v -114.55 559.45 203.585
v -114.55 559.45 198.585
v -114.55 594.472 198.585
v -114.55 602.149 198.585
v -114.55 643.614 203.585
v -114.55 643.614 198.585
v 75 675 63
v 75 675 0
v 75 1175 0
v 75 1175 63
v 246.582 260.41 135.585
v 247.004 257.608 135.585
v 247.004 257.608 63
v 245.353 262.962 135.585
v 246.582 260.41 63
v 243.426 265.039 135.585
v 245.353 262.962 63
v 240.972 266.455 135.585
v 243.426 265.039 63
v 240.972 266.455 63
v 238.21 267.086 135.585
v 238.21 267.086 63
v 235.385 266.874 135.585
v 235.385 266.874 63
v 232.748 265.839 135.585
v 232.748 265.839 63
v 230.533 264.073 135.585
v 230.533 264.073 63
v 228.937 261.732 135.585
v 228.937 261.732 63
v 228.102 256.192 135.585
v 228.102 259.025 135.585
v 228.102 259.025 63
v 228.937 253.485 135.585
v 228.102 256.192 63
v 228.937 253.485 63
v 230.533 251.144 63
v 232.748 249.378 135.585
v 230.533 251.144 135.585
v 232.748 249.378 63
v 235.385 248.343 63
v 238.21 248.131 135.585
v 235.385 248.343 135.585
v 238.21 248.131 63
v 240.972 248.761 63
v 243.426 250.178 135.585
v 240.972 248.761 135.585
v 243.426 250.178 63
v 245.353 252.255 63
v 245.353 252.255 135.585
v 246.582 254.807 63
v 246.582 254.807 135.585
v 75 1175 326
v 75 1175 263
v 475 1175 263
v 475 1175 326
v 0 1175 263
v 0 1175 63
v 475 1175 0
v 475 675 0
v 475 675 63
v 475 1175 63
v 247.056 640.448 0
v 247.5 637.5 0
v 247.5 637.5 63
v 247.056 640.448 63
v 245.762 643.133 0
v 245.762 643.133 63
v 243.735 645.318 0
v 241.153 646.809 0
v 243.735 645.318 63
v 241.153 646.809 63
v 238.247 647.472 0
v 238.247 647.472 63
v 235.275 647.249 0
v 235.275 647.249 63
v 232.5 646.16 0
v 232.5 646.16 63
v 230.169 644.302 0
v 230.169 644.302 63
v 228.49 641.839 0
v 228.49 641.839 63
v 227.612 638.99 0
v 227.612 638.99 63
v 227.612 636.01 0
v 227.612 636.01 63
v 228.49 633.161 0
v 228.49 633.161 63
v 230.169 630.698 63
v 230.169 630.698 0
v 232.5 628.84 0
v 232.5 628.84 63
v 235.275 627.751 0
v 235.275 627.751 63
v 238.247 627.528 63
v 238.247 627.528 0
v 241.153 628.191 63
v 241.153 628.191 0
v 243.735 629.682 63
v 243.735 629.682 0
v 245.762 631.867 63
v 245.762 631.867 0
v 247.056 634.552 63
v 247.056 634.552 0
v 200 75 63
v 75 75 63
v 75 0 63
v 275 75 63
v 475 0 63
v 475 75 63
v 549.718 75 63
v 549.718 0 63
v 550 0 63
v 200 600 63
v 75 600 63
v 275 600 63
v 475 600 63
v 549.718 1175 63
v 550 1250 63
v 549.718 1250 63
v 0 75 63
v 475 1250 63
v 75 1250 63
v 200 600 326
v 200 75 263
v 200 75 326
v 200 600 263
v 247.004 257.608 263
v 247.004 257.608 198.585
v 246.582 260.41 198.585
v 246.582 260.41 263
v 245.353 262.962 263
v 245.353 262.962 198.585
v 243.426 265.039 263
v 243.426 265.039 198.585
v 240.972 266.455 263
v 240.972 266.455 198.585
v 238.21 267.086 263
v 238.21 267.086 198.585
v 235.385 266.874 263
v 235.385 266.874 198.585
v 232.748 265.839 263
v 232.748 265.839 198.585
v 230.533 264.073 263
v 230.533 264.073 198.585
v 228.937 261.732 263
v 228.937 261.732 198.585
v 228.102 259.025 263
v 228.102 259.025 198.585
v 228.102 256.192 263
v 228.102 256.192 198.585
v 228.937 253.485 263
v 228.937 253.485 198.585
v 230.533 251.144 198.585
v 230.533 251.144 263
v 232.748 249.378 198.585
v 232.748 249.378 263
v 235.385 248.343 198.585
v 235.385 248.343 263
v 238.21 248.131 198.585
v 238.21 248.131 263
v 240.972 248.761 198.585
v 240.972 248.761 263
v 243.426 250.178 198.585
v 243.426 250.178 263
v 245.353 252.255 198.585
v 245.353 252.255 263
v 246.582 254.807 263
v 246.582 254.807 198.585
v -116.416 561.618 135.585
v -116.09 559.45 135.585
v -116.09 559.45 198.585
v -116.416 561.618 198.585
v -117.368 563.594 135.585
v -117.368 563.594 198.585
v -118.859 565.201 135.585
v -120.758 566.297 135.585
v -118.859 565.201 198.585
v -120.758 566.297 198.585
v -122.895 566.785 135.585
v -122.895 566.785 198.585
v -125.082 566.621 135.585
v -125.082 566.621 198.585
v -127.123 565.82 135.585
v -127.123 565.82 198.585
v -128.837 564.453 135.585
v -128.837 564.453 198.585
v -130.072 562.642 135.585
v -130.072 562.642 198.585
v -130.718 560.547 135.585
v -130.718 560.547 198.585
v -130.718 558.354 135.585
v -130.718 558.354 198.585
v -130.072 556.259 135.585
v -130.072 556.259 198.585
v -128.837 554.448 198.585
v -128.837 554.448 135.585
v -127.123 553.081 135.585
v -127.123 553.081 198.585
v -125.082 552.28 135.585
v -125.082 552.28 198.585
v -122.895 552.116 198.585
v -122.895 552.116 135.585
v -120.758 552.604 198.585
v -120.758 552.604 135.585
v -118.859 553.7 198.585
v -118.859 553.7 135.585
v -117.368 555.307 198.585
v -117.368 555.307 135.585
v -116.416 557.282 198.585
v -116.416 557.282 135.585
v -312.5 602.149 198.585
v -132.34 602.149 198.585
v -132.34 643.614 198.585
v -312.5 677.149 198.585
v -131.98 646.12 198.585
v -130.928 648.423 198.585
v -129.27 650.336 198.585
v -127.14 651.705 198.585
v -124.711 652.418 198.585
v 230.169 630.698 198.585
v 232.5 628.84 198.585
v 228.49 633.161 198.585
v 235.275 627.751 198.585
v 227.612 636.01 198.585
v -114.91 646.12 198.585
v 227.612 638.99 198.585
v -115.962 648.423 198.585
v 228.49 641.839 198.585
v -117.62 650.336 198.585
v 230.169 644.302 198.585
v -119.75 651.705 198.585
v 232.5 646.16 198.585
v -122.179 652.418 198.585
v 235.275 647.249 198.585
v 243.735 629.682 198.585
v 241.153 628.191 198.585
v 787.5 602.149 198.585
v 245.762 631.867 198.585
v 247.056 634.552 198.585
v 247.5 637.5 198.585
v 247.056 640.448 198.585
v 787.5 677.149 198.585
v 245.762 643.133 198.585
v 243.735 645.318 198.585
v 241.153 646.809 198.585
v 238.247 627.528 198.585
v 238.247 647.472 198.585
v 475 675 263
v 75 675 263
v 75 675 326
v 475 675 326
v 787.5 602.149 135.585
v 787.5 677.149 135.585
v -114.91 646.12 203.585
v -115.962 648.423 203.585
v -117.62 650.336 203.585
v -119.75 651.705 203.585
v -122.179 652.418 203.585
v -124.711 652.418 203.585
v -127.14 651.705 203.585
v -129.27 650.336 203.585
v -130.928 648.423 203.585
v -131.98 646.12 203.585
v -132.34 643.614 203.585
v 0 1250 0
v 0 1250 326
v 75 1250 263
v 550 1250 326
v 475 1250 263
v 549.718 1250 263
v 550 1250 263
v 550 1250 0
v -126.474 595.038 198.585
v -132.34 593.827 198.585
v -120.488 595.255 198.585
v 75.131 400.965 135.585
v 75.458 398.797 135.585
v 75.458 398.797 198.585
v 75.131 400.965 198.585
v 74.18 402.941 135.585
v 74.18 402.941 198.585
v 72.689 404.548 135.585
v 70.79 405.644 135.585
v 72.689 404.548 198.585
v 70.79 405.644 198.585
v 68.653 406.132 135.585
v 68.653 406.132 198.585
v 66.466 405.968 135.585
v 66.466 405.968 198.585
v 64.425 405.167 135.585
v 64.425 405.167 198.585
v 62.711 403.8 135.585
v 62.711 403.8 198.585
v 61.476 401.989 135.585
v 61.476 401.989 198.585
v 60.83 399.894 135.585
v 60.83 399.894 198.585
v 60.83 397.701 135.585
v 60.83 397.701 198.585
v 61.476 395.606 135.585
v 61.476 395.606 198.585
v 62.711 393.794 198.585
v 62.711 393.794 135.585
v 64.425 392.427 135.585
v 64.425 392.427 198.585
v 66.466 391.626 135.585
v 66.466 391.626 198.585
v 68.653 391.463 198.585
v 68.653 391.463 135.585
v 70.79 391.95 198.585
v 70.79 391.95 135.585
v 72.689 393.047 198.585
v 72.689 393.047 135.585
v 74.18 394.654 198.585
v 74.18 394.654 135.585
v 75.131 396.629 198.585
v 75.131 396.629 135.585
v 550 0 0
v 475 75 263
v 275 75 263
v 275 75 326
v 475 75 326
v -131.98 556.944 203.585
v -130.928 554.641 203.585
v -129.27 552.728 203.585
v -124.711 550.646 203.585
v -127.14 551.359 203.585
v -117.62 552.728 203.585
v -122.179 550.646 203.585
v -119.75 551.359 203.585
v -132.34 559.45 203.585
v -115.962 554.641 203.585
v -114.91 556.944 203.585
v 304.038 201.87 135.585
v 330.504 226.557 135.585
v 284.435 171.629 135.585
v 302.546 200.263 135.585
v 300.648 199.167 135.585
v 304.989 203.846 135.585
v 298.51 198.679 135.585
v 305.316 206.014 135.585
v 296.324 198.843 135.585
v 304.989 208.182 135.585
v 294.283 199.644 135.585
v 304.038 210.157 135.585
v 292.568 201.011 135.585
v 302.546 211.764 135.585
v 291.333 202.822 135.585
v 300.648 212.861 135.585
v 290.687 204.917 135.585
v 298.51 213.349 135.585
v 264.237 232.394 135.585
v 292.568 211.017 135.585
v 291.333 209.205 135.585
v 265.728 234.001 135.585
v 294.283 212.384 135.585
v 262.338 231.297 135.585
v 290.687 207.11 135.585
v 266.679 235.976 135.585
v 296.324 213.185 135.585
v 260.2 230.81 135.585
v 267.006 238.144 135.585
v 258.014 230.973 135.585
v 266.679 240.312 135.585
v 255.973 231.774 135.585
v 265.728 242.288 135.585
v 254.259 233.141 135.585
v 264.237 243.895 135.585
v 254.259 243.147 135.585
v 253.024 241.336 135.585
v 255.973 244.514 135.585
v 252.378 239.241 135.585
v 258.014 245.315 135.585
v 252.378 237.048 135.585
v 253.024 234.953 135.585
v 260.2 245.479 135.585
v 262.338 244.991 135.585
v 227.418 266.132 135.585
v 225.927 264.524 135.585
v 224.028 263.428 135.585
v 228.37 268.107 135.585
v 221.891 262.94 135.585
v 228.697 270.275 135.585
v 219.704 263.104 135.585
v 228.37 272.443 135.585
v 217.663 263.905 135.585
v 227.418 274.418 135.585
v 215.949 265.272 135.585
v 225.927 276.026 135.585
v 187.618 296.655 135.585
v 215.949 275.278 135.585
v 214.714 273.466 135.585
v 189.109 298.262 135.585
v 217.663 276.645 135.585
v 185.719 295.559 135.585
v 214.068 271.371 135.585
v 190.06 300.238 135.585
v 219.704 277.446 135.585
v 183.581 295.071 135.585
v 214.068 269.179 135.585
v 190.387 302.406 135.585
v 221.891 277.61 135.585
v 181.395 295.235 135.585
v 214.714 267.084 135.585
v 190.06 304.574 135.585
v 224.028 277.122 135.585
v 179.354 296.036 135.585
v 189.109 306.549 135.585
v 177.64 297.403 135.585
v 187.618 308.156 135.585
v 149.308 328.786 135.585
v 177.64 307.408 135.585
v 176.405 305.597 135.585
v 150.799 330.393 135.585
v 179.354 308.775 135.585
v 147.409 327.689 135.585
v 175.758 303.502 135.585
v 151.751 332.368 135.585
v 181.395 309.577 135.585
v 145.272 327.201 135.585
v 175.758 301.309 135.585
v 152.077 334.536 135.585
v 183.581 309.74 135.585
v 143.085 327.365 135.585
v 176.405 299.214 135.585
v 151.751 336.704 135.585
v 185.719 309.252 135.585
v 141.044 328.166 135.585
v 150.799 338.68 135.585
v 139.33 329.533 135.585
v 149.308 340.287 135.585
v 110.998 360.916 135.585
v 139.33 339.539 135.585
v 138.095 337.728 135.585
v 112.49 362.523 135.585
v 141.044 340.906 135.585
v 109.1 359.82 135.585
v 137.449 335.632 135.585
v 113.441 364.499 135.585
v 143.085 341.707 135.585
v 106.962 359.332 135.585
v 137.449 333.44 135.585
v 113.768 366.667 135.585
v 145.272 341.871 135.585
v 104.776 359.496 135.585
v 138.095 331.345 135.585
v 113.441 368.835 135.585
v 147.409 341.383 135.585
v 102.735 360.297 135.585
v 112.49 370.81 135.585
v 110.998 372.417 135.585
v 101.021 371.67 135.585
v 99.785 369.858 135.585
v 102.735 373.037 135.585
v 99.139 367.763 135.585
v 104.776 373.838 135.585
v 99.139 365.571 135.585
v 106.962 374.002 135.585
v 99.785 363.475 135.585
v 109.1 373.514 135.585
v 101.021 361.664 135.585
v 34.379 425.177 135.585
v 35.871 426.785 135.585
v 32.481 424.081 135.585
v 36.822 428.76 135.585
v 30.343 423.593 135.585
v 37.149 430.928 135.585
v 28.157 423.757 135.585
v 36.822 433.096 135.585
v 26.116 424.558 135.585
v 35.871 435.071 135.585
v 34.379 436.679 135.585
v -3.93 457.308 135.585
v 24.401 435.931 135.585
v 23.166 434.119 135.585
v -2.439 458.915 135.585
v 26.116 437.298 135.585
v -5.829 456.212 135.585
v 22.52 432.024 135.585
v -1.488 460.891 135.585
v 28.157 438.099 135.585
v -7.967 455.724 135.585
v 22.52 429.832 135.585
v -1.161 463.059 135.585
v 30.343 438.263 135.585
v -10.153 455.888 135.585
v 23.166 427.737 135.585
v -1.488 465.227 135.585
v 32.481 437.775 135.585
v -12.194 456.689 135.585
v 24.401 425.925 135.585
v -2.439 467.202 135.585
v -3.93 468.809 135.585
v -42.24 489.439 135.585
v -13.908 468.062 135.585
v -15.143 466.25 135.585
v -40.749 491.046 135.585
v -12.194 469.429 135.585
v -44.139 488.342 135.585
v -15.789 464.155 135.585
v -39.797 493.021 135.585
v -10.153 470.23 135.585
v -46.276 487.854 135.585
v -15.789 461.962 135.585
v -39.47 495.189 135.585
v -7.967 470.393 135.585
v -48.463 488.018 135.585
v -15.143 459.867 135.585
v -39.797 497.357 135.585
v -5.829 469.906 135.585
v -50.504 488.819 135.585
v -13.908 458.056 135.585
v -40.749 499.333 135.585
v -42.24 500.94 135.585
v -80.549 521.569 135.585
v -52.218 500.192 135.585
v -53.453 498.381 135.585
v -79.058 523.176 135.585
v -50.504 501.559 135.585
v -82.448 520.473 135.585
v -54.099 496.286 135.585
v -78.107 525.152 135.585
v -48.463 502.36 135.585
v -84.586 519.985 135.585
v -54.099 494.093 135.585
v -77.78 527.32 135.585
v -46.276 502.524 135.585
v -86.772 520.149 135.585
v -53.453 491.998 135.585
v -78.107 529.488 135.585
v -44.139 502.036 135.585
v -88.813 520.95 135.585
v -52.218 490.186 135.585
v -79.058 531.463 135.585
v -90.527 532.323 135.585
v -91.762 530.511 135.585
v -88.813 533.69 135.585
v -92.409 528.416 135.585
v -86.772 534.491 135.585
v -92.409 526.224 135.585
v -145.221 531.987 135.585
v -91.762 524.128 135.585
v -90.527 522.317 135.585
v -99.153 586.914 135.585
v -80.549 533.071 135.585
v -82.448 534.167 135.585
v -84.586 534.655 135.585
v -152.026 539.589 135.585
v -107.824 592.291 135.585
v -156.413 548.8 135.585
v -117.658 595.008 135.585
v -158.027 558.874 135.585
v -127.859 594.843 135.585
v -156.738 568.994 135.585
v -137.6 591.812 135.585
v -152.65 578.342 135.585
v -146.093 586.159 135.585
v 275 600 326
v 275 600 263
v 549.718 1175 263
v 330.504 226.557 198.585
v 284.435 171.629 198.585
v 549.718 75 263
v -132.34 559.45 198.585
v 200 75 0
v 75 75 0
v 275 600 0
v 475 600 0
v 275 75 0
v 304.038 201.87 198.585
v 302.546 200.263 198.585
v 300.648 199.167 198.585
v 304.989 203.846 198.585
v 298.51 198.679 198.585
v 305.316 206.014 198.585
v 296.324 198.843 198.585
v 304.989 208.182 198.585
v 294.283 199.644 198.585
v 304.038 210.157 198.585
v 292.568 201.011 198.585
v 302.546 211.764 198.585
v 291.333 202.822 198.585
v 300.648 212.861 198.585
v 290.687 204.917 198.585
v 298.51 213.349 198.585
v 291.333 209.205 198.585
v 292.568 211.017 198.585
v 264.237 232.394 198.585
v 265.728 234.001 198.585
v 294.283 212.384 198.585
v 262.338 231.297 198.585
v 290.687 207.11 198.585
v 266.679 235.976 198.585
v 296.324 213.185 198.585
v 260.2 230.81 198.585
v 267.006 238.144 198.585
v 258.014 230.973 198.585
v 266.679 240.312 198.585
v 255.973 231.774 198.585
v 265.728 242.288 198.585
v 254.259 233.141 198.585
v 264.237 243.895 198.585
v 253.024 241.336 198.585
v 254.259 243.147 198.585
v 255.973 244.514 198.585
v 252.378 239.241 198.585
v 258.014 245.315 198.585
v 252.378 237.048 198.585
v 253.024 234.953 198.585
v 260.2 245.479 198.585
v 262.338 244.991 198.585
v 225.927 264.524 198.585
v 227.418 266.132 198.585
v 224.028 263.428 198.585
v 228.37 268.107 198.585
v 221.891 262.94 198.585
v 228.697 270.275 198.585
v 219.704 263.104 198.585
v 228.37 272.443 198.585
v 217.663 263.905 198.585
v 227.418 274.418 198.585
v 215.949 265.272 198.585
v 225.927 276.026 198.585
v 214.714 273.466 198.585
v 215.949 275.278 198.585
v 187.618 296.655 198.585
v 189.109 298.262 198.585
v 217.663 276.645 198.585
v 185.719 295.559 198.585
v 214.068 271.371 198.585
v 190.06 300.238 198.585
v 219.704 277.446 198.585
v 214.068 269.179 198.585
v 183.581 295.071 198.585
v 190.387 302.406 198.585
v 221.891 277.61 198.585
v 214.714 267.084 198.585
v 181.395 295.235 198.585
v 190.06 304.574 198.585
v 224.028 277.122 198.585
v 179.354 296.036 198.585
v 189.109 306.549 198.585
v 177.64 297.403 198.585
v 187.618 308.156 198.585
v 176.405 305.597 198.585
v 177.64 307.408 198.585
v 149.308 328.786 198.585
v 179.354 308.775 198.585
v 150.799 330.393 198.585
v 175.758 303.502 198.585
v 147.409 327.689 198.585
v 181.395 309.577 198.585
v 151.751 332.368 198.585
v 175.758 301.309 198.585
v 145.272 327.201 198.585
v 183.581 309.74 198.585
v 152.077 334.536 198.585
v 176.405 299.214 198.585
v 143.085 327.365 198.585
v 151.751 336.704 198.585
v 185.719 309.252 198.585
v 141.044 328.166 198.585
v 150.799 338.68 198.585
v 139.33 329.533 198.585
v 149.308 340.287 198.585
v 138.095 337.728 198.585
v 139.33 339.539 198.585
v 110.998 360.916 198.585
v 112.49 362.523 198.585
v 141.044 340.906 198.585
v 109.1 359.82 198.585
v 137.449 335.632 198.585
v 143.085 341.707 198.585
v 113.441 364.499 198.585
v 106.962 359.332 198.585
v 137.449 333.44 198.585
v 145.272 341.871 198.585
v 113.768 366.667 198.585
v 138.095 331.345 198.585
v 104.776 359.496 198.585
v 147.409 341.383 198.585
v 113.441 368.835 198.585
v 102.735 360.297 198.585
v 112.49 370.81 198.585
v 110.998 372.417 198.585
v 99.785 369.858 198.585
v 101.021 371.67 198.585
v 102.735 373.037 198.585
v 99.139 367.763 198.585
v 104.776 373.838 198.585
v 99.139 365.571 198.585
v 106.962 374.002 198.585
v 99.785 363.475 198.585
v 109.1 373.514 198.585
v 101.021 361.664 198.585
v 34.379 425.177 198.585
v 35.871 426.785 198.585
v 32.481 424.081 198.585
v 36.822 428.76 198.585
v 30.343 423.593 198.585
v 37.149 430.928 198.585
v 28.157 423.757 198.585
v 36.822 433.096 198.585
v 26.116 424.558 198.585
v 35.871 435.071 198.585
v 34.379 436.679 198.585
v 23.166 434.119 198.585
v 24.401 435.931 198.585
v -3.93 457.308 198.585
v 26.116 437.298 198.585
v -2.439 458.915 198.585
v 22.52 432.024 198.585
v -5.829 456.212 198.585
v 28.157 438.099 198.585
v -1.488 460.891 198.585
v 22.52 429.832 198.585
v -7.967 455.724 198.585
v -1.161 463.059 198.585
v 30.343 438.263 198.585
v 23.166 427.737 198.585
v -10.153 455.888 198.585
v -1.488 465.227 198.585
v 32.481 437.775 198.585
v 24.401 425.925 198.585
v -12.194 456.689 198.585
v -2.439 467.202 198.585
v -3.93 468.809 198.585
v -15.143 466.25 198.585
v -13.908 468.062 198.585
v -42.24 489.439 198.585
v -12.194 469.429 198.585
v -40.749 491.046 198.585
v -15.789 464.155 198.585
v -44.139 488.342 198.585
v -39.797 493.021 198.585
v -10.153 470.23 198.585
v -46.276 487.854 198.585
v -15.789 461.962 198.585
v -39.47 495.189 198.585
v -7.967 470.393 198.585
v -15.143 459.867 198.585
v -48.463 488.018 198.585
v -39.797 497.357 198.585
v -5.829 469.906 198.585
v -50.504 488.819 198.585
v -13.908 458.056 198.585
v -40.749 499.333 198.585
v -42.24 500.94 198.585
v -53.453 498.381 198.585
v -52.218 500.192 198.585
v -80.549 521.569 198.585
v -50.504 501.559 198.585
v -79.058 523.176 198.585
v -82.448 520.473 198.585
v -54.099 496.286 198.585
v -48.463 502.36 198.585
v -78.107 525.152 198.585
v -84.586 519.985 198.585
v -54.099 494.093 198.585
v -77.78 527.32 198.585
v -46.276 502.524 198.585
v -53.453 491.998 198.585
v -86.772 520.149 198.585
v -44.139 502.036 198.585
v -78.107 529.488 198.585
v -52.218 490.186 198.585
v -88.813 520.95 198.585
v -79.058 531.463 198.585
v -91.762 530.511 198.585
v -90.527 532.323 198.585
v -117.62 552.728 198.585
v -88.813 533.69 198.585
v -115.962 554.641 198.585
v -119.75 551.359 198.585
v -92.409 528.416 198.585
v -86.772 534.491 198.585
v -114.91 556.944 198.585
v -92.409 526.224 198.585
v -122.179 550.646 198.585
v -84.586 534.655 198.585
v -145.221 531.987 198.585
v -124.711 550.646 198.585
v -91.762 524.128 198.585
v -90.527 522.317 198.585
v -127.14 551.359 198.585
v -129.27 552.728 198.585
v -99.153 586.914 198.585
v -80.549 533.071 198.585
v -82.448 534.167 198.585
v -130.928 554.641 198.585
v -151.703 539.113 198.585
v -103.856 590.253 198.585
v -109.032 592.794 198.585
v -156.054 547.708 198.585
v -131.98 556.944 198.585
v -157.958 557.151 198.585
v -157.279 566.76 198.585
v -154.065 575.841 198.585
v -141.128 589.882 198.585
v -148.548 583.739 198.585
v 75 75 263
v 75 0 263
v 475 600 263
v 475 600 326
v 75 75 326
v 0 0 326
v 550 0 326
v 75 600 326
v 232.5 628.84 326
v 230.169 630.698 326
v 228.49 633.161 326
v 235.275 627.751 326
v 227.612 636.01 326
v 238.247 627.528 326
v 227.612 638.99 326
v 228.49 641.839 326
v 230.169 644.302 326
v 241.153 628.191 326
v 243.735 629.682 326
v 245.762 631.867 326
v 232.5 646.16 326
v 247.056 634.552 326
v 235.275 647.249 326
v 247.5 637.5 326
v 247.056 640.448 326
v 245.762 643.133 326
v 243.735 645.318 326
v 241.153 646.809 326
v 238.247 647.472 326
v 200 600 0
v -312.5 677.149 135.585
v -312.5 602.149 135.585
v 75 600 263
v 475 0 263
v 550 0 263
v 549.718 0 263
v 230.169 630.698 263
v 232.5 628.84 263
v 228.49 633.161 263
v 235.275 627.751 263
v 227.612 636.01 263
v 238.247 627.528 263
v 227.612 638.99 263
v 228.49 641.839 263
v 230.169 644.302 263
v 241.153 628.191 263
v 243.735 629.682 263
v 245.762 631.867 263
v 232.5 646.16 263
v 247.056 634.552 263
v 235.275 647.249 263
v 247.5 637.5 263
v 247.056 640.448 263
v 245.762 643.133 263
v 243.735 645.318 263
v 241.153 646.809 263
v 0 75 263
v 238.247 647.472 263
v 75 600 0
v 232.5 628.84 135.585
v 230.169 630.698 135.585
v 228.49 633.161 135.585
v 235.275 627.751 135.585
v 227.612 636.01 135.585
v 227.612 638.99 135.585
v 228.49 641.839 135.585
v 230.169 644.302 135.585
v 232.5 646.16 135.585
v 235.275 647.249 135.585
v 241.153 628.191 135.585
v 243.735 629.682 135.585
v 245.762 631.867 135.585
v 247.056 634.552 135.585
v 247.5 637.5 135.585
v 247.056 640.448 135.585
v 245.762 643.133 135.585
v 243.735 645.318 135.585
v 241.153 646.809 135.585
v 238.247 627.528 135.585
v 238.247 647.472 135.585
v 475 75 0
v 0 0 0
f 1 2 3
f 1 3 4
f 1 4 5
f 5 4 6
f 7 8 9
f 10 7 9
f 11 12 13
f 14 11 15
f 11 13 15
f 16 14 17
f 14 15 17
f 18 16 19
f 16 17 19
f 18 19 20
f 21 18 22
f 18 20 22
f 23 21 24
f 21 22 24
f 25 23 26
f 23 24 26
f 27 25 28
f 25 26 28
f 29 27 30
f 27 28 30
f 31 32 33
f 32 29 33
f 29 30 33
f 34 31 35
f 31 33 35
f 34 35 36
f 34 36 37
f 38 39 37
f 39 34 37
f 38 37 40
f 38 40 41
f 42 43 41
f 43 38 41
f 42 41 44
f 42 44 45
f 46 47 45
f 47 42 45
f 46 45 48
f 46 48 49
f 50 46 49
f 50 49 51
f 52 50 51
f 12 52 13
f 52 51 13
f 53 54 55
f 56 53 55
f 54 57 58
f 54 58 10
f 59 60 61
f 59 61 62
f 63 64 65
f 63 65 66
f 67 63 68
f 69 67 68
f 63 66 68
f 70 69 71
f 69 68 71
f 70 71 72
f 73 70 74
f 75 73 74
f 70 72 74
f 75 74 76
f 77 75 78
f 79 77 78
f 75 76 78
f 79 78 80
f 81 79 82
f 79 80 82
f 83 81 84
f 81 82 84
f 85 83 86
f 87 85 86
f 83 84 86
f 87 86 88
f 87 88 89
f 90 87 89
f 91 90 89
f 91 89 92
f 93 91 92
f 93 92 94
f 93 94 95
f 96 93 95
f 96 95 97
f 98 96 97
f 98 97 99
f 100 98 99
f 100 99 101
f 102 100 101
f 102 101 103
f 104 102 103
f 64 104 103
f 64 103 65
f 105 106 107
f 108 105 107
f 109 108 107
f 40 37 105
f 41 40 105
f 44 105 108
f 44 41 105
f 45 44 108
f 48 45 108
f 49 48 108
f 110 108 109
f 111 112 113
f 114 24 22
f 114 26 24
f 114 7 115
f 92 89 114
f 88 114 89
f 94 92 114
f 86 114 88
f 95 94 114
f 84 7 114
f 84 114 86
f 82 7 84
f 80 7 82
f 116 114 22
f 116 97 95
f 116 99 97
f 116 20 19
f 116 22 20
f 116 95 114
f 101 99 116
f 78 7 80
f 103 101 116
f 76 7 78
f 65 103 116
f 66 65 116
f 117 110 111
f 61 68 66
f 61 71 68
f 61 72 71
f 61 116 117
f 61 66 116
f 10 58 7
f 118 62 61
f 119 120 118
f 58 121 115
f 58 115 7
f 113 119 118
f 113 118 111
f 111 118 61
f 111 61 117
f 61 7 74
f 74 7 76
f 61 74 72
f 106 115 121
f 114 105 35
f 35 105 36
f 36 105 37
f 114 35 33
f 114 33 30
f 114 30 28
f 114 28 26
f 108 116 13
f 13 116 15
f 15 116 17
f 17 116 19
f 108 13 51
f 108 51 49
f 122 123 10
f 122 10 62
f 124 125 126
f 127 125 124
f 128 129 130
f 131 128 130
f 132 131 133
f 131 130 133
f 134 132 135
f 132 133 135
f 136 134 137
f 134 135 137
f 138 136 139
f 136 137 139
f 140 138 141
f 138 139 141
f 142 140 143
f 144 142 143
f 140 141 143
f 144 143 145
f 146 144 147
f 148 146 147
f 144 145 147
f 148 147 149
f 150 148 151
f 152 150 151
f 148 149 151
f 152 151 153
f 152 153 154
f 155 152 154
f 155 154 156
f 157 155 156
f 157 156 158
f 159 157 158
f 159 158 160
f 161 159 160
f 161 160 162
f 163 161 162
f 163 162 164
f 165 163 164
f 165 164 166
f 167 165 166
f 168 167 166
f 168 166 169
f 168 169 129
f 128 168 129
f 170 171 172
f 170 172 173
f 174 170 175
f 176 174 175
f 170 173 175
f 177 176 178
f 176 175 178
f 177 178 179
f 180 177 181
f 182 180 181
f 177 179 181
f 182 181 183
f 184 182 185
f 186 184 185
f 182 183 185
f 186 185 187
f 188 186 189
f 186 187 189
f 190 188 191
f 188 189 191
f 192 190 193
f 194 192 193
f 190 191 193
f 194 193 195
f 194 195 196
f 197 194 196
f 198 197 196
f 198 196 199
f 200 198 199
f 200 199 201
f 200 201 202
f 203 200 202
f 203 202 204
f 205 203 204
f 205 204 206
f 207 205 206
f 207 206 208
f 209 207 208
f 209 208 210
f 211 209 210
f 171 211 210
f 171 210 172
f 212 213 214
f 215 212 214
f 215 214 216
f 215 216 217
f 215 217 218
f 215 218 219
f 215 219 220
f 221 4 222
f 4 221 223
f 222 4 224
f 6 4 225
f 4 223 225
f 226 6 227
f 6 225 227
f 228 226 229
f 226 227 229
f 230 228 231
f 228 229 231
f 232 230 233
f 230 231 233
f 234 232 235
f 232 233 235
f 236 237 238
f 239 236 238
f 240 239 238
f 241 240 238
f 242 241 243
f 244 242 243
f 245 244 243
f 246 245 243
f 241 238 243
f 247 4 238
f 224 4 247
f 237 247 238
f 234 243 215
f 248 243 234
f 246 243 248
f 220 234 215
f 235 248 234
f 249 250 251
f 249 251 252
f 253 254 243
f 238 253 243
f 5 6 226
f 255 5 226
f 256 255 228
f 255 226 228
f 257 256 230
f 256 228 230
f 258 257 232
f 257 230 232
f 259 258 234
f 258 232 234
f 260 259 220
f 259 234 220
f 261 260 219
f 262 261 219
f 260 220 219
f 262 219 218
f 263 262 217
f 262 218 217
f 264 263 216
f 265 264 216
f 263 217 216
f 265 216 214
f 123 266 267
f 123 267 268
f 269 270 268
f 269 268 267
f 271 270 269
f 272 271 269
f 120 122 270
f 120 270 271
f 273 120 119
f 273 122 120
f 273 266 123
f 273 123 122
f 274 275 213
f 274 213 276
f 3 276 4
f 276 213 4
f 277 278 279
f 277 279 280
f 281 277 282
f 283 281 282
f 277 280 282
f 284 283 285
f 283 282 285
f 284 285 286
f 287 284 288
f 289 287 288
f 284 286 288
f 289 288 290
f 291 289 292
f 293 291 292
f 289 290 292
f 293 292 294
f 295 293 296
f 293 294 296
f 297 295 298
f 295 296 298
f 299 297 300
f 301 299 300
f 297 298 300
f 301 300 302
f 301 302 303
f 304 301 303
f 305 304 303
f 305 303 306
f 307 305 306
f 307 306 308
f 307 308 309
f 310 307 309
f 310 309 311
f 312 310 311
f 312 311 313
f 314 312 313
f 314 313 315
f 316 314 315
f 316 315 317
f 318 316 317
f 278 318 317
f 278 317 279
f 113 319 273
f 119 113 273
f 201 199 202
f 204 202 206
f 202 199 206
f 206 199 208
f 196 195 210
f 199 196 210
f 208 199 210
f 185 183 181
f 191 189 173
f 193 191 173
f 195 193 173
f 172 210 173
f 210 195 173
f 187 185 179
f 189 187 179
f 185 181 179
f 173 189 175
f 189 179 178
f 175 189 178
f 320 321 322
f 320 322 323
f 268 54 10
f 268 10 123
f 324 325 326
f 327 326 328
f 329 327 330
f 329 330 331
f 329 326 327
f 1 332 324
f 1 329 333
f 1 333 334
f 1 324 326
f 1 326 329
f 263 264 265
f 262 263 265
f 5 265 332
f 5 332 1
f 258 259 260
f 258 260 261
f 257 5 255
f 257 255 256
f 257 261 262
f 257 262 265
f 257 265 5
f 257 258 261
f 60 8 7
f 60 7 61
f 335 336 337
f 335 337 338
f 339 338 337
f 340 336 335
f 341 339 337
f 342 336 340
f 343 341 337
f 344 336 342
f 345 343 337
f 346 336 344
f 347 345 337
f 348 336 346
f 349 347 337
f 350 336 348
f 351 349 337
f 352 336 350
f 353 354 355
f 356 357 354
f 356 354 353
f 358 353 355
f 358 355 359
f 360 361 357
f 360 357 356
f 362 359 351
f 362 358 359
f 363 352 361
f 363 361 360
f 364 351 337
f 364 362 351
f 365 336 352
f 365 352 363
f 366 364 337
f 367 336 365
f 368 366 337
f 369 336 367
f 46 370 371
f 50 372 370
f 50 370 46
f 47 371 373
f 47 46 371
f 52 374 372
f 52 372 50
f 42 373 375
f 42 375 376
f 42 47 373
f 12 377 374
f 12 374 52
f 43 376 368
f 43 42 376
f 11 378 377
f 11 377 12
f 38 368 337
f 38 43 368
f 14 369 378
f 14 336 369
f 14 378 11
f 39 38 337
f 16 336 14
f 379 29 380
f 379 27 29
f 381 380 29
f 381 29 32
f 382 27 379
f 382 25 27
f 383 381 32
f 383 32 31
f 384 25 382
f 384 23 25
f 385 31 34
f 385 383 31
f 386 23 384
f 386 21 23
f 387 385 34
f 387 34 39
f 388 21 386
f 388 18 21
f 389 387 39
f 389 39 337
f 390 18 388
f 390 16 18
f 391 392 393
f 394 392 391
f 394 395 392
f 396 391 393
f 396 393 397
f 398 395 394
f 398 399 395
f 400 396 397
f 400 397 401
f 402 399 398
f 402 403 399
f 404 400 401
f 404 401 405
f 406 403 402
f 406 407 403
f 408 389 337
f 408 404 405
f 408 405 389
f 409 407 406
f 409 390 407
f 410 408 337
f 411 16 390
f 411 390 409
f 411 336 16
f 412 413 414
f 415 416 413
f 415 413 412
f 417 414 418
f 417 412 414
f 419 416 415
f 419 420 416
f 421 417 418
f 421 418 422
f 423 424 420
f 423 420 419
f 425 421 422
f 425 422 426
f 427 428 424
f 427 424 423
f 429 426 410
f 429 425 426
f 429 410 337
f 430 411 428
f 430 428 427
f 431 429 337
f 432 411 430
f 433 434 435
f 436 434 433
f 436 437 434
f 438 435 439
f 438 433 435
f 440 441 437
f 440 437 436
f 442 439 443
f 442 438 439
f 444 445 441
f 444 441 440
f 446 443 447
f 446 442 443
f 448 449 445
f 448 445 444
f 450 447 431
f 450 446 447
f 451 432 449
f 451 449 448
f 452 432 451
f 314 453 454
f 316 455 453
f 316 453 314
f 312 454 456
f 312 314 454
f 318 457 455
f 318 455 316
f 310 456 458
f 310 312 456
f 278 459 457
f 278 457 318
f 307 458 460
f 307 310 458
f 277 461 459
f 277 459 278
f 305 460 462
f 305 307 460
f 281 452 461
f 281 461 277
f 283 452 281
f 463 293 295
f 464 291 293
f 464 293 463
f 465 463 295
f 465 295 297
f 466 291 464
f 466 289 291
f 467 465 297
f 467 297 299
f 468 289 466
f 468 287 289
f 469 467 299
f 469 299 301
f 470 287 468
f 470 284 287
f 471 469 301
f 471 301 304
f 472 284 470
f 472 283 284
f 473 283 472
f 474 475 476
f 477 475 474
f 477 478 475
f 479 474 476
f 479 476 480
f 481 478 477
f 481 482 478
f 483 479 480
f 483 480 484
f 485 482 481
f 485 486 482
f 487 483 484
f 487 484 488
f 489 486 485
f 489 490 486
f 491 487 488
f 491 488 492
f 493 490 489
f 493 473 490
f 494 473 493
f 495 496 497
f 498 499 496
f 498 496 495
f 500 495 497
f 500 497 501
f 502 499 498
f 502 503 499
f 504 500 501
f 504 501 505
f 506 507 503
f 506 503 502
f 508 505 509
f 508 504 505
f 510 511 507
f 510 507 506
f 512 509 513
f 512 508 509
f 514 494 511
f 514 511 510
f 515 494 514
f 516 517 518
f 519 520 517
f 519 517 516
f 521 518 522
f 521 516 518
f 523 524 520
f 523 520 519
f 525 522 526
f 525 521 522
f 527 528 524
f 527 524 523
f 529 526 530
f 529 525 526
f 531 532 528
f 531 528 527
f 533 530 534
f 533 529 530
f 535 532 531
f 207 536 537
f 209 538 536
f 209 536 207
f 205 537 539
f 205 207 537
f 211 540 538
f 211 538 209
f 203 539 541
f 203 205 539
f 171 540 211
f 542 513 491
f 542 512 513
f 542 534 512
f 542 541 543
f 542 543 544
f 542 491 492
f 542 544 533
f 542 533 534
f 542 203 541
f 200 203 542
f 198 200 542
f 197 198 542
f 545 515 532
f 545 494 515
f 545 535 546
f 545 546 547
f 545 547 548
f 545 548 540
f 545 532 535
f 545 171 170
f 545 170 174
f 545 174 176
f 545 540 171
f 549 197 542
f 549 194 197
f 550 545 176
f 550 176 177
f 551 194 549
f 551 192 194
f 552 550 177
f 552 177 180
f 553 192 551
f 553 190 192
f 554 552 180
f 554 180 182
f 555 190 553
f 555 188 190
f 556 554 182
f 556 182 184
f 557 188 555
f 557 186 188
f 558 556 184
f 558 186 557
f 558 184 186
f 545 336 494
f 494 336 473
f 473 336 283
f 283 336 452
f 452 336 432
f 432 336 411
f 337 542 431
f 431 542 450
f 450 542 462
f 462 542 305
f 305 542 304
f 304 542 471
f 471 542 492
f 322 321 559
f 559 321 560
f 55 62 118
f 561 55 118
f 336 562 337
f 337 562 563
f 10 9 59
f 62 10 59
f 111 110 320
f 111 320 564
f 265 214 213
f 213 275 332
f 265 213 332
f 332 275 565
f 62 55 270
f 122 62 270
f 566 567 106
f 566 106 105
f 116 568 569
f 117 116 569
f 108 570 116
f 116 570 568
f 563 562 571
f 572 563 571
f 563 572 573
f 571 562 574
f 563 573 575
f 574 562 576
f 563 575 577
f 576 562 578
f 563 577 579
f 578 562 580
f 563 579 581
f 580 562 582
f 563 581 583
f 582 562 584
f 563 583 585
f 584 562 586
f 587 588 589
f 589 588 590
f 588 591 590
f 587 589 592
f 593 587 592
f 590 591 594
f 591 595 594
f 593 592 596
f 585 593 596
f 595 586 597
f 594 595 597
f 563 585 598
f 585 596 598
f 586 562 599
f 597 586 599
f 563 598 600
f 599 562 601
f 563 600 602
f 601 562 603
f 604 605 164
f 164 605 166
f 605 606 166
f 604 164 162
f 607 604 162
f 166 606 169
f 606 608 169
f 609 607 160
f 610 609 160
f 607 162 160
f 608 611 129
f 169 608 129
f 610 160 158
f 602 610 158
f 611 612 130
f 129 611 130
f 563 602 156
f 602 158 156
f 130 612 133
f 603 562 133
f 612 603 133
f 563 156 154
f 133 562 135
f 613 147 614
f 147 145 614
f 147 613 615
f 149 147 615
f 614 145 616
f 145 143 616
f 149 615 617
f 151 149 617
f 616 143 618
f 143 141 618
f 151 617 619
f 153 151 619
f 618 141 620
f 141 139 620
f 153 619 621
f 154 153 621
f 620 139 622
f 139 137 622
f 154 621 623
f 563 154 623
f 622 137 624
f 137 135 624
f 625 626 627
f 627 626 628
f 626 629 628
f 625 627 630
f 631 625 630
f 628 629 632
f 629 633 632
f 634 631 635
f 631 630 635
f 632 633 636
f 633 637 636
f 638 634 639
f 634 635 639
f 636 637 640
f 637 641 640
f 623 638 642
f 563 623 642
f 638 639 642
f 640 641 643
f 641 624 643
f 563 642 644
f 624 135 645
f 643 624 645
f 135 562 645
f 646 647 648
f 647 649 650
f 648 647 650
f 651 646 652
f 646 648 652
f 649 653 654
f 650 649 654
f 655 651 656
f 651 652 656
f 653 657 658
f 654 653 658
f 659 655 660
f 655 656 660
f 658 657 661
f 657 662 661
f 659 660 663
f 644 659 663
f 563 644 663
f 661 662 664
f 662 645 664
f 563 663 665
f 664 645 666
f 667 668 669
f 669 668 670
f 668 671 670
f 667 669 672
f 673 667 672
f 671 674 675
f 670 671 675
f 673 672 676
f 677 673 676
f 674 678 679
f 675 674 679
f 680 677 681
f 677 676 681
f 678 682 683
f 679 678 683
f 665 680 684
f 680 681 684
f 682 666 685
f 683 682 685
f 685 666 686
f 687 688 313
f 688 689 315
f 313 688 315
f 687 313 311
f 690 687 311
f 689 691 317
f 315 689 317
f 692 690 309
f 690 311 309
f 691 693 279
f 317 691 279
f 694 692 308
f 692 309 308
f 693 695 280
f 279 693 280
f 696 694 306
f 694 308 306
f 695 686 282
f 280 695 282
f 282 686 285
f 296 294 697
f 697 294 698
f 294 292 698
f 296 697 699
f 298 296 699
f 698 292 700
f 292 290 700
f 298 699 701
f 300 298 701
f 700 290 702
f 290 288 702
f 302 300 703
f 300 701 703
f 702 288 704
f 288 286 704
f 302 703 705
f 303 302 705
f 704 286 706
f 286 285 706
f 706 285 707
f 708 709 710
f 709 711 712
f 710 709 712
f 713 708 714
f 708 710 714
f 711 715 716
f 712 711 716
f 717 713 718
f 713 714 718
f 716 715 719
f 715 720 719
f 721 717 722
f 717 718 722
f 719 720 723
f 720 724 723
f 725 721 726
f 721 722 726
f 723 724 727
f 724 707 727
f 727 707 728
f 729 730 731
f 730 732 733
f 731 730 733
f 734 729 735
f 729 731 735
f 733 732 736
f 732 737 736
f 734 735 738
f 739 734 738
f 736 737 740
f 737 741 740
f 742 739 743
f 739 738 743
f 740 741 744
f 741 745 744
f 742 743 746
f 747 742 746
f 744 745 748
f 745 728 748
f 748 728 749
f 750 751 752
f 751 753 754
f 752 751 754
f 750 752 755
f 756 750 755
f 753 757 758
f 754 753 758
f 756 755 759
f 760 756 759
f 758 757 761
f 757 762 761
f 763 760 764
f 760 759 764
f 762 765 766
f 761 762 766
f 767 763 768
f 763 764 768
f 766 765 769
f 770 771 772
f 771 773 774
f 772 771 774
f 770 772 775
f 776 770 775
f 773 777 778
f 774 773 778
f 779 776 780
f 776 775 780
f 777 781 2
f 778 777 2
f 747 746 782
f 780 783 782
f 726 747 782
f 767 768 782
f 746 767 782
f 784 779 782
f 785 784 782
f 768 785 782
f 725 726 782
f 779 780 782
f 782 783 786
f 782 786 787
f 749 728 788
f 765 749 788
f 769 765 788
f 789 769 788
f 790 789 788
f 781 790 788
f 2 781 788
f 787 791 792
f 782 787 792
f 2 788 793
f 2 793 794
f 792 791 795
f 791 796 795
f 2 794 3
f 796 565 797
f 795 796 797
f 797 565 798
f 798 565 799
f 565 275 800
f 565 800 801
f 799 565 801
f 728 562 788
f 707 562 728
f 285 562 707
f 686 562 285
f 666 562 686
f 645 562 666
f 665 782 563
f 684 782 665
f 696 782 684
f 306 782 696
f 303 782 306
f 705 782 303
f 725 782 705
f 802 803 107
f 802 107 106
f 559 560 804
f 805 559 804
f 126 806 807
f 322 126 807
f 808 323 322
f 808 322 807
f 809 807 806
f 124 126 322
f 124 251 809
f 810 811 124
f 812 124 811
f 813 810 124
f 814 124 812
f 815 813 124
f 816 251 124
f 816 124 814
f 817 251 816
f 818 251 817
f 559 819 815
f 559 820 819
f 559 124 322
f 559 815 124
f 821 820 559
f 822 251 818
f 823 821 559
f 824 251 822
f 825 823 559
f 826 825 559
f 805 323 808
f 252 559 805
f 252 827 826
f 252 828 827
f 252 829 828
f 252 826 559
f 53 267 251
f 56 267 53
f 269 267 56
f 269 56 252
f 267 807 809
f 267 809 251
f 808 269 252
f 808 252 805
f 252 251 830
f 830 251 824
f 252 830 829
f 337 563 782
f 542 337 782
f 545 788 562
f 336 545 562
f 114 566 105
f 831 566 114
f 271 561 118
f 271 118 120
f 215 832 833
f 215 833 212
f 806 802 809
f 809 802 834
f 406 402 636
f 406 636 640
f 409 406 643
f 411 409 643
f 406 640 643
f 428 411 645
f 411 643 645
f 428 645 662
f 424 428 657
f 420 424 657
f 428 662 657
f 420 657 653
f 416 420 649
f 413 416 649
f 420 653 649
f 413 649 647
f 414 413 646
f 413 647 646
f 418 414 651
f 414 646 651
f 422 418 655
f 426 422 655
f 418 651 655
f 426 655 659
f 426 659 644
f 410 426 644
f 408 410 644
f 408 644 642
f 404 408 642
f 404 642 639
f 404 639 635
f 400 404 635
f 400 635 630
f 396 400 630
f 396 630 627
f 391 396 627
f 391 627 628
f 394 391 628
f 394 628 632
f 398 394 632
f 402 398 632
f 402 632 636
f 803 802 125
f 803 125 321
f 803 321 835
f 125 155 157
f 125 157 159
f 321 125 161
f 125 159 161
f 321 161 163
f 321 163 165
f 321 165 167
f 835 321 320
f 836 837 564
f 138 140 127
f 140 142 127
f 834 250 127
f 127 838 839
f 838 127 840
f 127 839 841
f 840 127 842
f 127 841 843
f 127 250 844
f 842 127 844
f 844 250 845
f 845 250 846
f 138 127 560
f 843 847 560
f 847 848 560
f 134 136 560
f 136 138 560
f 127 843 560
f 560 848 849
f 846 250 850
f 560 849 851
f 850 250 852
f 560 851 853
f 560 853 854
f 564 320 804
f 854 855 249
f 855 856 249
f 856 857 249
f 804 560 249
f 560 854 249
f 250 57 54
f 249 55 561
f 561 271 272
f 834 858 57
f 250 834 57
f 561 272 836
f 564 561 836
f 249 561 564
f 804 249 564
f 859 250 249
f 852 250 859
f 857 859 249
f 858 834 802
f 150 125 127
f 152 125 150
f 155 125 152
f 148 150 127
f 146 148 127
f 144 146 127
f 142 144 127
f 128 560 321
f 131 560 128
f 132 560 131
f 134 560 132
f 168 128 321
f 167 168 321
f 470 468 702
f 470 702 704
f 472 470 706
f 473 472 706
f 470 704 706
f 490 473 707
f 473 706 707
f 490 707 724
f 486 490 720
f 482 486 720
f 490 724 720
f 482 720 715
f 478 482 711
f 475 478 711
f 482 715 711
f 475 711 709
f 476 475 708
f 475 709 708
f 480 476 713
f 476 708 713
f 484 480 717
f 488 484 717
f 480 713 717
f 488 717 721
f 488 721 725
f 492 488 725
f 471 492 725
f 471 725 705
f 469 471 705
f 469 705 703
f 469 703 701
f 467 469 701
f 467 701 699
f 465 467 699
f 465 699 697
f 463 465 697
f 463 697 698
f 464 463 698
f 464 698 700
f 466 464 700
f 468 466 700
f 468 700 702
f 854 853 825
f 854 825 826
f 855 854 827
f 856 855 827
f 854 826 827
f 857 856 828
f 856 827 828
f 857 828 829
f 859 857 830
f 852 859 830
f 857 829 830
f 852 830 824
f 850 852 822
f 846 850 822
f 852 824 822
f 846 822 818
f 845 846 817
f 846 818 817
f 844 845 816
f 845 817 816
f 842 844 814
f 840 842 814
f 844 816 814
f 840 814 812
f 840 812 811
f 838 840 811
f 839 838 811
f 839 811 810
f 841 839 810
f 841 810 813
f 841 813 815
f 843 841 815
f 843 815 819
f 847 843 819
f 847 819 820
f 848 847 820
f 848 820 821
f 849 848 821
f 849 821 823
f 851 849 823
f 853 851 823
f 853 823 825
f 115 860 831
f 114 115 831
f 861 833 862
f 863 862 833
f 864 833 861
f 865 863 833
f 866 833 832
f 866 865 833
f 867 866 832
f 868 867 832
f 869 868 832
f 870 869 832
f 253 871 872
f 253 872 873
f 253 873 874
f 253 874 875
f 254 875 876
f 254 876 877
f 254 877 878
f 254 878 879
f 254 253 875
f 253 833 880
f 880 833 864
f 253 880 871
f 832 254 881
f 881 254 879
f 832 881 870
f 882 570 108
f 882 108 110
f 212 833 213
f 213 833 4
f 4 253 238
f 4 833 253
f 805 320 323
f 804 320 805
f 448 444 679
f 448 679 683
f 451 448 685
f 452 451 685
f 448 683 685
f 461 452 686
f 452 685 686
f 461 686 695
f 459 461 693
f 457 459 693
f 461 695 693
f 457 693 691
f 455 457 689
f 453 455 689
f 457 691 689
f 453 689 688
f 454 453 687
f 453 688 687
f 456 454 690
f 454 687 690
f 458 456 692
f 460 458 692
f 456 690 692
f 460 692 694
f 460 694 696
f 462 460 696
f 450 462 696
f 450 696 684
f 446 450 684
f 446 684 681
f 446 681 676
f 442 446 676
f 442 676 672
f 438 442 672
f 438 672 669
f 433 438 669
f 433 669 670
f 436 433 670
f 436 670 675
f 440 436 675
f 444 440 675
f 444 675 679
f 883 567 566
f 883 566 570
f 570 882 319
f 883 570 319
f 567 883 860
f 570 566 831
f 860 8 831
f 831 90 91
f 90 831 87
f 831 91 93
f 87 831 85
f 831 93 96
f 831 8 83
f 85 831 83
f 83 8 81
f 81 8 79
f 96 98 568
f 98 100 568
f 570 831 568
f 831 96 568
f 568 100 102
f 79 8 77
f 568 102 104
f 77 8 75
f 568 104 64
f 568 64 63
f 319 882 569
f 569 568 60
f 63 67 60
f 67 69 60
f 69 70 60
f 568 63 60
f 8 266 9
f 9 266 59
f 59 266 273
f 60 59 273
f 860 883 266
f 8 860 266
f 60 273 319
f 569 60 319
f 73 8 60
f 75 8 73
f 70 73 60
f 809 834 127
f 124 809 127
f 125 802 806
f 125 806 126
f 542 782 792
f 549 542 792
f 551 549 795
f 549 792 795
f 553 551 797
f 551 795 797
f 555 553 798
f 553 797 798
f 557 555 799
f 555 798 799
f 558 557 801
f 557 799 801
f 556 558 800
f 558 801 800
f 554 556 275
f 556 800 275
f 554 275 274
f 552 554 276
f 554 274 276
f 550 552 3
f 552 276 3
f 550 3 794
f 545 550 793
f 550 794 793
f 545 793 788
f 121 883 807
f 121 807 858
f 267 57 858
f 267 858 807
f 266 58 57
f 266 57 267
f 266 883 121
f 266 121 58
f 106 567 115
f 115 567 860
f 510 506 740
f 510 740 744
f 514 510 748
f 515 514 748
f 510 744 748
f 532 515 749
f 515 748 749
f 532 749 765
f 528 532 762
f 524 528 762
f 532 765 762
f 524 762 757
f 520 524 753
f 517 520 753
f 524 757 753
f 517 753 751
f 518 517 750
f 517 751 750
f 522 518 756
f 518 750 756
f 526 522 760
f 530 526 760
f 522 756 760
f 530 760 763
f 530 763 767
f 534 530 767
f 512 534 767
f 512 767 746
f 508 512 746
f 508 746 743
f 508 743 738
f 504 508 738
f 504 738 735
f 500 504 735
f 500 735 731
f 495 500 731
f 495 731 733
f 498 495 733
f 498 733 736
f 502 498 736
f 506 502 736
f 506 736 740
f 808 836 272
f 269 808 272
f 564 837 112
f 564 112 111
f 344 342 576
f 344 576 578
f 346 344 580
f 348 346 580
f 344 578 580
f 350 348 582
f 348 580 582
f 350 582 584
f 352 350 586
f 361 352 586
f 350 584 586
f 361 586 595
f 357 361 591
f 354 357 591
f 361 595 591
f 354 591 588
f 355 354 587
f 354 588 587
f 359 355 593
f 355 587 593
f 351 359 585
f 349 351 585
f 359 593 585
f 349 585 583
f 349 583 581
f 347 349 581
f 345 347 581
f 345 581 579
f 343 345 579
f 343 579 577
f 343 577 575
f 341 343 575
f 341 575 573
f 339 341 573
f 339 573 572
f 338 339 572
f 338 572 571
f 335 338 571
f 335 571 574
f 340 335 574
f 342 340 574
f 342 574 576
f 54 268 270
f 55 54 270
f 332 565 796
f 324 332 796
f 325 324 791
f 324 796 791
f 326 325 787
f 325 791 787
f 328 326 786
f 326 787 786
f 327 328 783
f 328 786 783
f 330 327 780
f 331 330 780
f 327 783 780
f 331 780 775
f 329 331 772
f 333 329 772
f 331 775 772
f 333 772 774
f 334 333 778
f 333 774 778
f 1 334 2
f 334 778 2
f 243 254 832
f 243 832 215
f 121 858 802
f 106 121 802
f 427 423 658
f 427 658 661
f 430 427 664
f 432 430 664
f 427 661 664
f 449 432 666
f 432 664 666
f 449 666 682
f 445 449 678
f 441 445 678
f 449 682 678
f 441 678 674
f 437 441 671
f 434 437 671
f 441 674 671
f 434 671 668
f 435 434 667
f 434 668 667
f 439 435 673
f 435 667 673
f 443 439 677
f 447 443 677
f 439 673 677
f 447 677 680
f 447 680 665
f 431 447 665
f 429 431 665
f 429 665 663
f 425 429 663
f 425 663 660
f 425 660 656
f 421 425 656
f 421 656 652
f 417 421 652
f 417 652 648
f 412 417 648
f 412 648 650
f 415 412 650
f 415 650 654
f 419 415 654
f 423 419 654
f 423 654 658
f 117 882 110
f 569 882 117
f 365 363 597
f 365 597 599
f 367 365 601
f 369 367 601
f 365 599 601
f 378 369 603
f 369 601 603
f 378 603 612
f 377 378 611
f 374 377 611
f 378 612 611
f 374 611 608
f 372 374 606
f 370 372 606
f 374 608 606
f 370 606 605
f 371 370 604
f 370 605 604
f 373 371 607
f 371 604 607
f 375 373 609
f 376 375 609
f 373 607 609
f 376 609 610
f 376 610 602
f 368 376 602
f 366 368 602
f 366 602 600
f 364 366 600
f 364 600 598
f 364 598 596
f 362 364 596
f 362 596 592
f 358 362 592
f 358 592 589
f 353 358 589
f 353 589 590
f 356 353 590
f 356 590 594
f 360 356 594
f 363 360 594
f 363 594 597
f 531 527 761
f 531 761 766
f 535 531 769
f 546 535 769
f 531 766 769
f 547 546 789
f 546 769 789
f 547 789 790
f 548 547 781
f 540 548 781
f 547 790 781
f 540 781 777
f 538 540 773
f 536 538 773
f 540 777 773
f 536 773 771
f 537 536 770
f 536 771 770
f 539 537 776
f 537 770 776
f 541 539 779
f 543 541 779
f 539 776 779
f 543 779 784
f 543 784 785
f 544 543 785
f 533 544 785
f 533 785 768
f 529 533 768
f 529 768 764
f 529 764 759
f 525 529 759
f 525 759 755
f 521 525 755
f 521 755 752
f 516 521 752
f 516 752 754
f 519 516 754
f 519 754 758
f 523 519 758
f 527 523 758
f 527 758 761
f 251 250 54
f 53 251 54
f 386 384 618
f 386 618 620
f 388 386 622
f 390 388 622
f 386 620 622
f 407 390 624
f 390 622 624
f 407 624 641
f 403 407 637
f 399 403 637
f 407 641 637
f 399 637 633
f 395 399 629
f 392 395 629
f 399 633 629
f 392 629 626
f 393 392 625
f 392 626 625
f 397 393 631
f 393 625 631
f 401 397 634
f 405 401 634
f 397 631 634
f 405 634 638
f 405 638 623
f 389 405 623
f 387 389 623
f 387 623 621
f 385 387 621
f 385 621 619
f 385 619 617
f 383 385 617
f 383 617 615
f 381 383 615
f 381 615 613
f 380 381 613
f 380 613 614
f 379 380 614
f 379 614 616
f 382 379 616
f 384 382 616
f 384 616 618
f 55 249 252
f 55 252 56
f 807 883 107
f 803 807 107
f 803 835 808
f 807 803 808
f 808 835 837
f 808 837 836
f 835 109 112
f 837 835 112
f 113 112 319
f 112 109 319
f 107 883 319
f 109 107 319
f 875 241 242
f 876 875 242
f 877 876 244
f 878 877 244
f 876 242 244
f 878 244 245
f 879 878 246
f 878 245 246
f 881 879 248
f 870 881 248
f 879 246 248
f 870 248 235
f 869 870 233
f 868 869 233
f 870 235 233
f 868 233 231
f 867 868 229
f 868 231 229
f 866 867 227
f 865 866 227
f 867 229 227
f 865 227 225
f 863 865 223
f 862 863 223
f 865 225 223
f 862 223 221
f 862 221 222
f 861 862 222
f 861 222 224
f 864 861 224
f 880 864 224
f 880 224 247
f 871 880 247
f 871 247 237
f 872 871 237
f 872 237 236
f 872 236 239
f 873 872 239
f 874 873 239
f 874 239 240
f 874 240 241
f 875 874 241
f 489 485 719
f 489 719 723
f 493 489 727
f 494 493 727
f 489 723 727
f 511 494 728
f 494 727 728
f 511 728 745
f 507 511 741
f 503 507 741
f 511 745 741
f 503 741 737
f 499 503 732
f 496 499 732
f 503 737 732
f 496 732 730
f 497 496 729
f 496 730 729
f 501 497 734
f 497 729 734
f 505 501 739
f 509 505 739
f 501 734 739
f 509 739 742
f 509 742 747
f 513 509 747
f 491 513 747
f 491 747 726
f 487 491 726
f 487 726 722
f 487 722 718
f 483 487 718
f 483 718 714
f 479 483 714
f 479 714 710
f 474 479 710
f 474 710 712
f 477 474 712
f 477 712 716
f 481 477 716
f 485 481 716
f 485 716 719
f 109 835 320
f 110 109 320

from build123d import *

# Parameters (mm, degrees)
ESQUISSE1_W                = 550
ESQUISSE1_H                = 1250
ESQUISSE1_W_2              = 125
ESQUISSE1_H_2              = 525
ESQUISSE1_W_3              = 200
ESQUISSE1_W_4              = 400
ESQUISSE1_H_3              = 500
BOSS_EXTRU_1_DEPTH         = 63
R_P_TITION_LIN_AIRE1_COUNT = 2
R_P_TITION_LIN_AIRE1_PITCH = 263
ESQUISSE2_W                = 75
ESQUISSE2_H                = 75
ESQUISSE2_W_2              = 74.718169062
BOSS_EXTRU_2_DEPTH         = 200
BOSS_EXTRU_4_DEPTH         = 550
BOSS_EXTRU_4_DEPTH_BACK    = 550
ESQUISSE7_W                = 63
ESQUISSE7_H                = 75
ESQUISSE3_R                = 10
ENL_V_MAT_EXTRU_2_DEPTH    = 1513.921759378
BOSS_EXTRU_5_DEPTH         = 63
BOSS_EXTRU_6_DEPTH         = 5
ESQUISSE12_R               = 7.355365699
ENL_V_MAT_EXTRU_3_DEPTH    = 100
R_P_TITION_LIN_AIRE2_COUNT = 12
R_P_TITION_LIN_AIRE2_PITCH = 50
BOSS_EXTRU_7_START         = -263
ESQUISSE13_R               = 9.503964929
BOSS_EXTRU_7_DEPTH         = 200


with BuildPart() as part:
    # Esquisse1 → Boss.-Extru.1 (new body)
    with BuildSketch(Plane.XY):
        with Locations((275, 625)):
            Rectangle(ESQUISSE1_W, ESQUISSE1_H)
        with Locations((137.5, 337.5)):
            Rectangle(ESQUISSE1_W_2, ESQUISSE1_H_2, mode=Mode.SUBTRACT)
        with Locations((375, 337.5)):
            Rectangle(ESQUISSE1_W_3, ESQUISSE1_H_2, mode=Mode.SUBTRACT)
        with Locations((275, 925)):
            Rectangle(ESQUISSE1_W_4, ESQUISSE1_H_3, mode=Mode.SUBTRACT)
    extrude(amount=BOSS_EXTRU_1_DEPTH)


with BuildPart() as r_p_tition_lin_aire1_1:
    # Répétition linéaire1: pattern copy
    add(part.part.moved(Location(Vector(0, 0, 1) * (1 * R_P_TITION_LIN_AIRE1_PITCH))))


with BuildPart() as part_1:
    add(part.part)

    add(r_p_tition_lin_aire1_1.part)  # Boss.-Extru.2 merges Répétition linéaire1_1
    # Esquisse2 → Boss.-Extru.2 (add)
    with BuildSketch(Plane.XY.offset(63)):
        with Locations((37.5, 37.5)):
            Rectangle(ESQUISSE2_W, ESQUISSE2_H)
        with Locations((512.359084531, 37.5)):
            Rectangle(ESQUISSE2_W_2, ESQUISSE2_H)
        with Locations((512.359084531, 1212.5)):
            Rectangle(ESQUISSE2_W_2, ESQUISSE2_H)
        with Locations((37.5, 1212.5)):
            Rectangle(ESQUISSE2_W, ESQUISSE2_H)
    extrude(amount=BOSS_EXTRU_2_DEPTH)


with BuildPart() as body_2:
    # Esquisse7 → Boss.-Extru.4 (new, two sides: drawn at the far end of the back side and taken through both)
    with BuildSketch(Plane.ZY.offset(-237.5).offset(-BOSS_EXTRU_4_DEPTH_BACK)):
        with Locations((167.0850662, 639.649163537)):
            Rectangle(ESQUISSE7_W, ESQUISSE7_H)
    extrude(amount=BOSS_EXTRU_4_DEPTH + BOSS_EXTRU_4_DEPTH_BACK)


with BuildPart() as enl_v_mat_extru_2_tool:
    # Esquisse3 → Enlèv. mat.-Extru.2 (new, through all)
    with BuildSketch(Plane.XY.offset(326)):
        with Locations((237.5, 637.5)):
            Circle(ESQUISSE3_R)
    extrude(amount=-ENL_V_MAT_EXTRU_2_DEPTH)


with BuildPart() as part_2:
    add(part_1.part)

    # Enlèv. mat.-Extru.2: cut by enl_v_mat_extru_2_tool
    add(enl_v_mat_extru_2_tool.part, mode=Mode.SUBTRACT)



with BuildPart() as body_2_1:
    add(body_2.part)

    # Enlèv. mat.-Extru.2: cut by enl_v_mat_extru_2_tool
    add(enl_v_mat_extru_2_tool.part, mode=Mode.SUBTRACT)



with BuildPart() as body_3:
    # Esquisse11 → Boss.-Extru.5 (new body)
    with BuildSketch(Plane.XY.offset(198.5850662)):
        with BuildLine():
            Line((-99.153084709, 586.914270743), (330.503621206, 226.557033524))
            Line((330.503621206, 226.557033524), (284.435304351, 171.629424966))
            Line((284.435304351, 171.629424966), (-145.221401564, 531.986662185))
            ThreePointArc((-145.221401564, 531.986662185), (-149.651047416, 582.484624891), (-99.153084709, 586.914270743))
        make_face()
    extrude(amount=-BOSS_EXTRU_5_DEPTH)


with BuildPart() as body_2_2:
    add(body_2_1.part)

    add(body_3.part)  # Boss.-Extru.6 merges body 3
    # Esquisse11<3> → Boss.-Extru.6 (add)
    with BuildSketch(Plane.XY.offset(198.5850662)):
        with BuildLine():
            Line((-114.54998443, 559.450466464), (-114.54998443, 643.613737641))
            ThreePointArc((-114.54998443, 643.613737641), (-123.445013511, 652.508766722), (-132.340042592, 643.613737641))
            Line((-132.340042592, 643.613737641), (-132.340042592, 559.450466464))
            ThreePointArc((-132.340042592, 559.450466464), (-123.445013511, 550.555437383), (-114.54998443, 559.450466464))
        make_face()
    extrude(amount=BOSS_EXTRU_6_DEPTH)

    # Esquisse12 → Enlèv. mat.-Extru.3 (cut)
    with BuildSketch(Plane.XY.offset(198.5850662)):
        with Locations((-123.445013511, 559.450466464)):
            Circle(ESQUISSE12_R)
    enl_v_mat_extru_3 = extrude(amount=-ENL_V_MAT_EXTRU_3_DEPTH, mode=Mode.SUBTRACT)

    # Répétition linéaire2: Enlèv. mat.-Extru.3 ×12
    with Locations(*[Vector(0.7661915431257939, -0.6426122619764696, 0) * (i * R_P_TITION_LIN_AIRE2_PITCH) for i in range(1, R_P_TITION_LIN_AIRE2_COUNT)]):
        add(enl_v_mat_extru_3, mode=Mode.SUBTRACT)


with BuildPart() as part_3:
    add(part_2.part)

    add(body_2_2.part)  # Boss.-Extru.7 merges body 2
    # Esquisse13 → Boss.-Extru.7 (add)
    with BuildSketch(Plane.XY.offset(326).offset(BOSS_EXTRU_7_START)):
        with Locations((237.5, 257.608372702)):
            Circle(ESQUISSE13_R)
    extrude(amount=BOSS_EXTRU_7_DEPTH)


solid = part_3.part
